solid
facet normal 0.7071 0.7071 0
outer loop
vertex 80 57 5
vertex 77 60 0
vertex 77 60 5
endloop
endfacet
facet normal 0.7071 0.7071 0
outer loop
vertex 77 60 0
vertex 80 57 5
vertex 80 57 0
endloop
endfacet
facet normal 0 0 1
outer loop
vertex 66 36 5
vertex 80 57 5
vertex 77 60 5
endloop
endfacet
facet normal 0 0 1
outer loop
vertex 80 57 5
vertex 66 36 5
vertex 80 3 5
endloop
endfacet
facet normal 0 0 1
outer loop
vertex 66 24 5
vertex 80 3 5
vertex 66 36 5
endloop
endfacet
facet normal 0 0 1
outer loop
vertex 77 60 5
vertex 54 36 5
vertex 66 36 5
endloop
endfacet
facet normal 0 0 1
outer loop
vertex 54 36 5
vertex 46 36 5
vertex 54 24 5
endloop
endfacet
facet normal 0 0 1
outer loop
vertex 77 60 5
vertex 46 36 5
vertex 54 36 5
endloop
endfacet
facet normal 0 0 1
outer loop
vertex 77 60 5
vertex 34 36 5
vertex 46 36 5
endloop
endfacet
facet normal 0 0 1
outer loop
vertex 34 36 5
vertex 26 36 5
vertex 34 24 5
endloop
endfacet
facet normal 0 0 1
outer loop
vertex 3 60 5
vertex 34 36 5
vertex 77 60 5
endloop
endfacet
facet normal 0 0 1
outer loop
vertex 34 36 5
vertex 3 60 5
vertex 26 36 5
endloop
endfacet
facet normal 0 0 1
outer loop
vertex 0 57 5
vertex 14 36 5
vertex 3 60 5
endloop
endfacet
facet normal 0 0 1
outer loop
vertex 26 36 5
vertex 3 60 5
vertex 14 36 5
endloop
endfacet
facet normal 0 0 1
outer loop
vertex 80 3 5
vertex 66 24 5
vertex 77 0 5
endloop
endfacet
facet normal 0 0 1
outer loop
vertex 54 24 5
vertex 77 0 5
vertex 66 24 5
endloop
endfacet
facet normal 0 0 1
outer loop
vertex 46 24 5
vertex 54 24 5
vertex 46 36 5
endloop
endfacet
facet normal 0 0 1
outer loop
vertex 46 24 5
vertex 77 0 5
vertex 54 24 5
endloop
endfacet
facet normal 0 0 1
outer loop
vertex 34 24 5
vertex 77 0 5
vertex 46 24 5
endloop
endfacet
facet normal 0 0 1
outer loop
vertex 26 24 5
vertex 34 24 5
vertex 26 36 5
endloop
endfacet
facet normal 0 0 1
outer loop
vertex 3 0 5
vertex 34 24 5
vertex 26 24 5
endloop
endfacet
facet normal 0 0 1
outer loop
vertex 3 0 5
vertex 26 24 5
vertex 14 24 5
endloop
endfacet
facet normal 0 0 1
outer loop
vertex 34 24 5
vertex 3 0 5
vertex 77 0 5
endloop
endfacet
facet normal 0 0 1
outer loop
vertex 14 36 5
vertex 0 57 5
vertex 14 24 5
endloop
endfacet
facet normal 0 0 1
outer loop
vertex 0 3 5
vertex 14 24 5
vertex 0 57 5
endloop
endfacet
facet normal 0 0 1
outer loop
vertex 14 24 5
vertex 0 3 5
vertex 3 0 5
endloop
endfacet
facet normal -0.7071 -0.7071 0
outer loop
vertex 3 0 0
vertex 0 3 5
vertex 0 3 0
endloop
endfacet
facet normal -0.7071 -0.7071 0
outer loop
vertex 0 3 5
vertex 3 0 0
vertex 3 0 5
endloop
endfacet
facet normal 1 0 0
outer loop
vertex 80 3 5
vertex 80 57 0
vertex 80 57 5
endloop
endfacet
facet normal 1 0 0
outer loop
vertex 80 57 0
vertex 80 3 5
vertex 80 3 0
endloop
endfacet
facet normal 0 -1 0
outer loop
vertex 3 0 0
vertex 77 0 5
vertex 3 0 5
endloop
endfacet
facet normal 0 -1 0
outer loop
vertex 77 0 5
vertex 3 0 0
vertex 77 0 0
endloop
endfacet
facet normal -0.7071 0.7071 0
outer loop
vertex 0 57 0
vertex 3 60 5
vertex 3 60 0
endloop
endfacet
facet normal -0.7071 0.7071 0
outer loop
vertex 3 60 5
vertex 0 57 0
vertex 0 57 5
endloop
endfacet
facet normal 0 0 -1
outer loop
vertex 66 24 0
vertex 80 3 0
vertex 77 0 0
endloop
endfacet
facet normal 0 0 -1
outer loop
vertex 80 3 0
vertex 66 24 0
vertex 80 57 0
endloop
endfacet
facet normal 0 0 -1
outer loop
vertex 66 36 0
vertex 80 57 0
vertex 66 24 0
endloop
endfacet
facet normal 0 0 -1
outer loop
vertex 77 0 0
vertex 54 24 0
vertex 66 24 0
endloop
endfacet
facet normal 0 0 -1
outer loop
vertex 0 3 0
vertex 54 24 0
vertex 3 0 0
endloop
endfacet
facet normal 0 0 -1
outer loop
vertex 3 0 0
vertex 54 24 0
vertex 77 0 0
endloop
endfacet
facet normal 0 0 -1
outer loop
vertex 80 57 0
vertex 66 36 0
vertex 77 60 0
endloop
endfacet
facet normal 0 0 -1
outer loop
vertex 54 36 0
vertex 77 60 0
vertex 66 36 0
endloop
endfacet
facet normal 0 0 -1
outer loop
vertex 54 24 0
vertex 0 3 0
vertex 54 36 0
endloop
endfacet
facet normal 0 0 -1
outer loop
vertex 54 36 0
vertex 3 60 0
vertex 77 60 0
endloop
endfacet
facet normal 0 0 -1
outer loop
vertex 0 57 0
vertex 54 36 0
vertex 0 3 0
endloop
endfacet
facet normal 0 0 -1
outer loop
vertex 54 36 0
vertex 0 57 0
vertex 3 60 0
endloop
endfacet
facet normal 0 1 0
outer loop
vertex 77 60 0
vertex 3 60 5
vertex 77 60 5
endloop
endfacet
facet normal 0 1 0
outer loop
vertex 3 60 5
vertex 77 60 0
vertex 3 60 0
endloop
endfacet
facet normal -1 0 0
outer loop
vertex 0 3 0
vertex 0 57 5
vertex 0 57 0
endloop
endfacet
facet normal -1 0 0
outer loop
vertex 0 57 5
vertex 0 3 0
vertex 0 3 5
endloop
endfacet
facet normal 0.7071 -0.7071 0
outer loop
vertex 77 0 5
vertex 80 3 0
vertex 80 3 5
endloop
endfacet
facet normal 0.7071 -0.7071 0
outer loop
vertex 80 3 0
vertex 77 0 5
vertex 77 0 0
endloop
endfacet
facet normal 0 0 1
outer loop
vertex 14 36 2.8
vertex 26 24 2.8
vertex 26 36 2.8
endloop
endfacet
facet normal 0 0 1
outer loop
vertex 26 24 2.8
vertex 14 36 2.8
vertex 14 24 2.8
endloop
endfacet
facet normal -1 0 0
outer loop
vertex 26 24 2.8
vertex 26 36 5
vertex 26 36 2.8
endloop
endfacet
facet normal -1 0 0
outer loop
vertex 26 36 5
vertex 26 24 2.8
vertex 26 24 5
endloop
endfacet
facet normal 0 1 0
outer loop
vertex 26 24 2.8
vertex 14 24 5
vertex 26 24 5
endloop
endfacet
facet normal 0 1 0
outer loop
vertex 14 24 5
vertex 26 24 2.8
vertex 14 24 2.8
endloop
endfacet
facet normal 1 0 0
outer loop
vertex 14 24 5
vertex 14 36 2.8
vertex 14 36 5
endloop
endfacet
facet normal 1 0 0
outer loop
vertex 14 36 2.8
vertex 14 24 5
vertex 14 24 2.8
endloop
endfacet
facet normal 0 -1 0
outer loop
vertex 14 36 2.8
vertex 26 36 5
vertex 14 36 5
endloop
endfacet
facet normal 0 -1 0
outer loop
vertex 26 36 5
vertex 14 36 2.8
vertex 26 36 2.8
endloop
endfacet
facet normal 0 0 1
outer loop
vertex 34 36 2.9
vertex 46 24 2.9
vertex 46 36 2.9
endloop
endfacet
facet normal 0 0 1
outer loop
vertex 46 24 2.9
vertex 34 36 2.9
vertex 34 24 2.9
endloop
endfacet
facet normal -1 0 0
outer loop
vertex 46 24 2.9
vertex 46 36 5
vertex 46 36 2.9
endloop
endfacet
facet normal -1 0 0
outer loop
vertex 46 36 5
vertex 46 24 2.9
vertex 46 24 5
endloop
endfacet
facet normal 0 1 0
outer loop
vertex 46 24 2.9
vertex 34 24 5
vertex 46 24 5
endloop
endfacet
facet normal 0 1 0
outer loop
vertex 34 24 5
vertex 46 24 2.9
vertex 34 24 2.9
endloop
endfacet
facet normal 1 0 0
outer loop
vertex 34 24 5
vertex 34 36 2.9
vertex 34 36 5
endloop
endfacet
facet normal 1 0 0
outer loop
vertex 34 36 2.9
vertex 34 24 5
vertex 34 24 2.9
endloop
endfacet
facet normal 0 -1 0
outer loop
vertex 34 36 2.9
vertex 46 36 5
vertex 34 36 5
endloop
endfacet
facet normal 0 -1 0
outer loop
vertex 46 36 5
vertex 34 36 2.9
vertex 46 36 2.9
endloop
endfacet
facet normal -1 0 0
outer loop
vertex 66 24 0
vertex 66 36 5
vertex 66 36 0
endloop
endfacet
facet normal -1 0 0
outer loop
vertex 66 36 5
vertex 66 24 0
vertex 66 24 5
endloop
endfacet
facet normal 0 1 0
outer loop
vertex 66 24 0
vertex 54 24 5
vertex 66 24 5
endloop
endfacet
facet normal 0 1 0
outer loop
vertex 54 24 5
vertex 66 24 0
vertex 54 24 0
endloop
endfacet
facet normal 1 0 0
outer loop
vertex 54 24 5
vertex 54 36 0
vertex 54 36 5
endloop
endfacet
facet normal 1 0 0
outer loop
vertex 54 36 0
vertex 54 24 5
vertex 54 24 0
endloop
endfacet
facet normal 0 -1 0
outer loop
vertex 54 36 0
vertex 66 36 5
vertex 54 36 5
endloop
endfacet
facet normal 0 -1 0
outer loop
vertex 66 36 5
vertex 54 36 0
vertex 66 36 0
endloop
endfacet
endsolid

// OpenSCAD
$fn = 32;

// ----------------------------------------------------------------------
// Windowed plate: 3 voids, 80 x 60 x 5 mm
// ----------------------------------------------------------------------

// --- parameters (mm) ---
plate_l = 80;             // plate length, X
plate_w = 60;             // plate width, Y
plate_t = 5;              // plate thickness, Z
edge_margin = 10;         // wall from the plate edge to any window
windows = 3;              // number of windows in the row
win_l = 12;               // window length
win_w = 12;               // window width
win_pitch = 20;           // window pitch along X
depth_1 = 2.2;            // depth of void 1 (full thickness = through)
depth_2 = 2.1;            // depth of void 2 (full thickness = through)
depth_3 = 5;              // depth of void 3 (full thickness = through)
corner_c = 3;             // corner chamfer of the plate

profile = [[3, 0], [77, 0], [80, 3], [80, 57], [77, 60], [3, 60], [0, 57], [0, 3]];  // primary outline, 8 points, counter clockwise
void_1 = [[14, 24], [26, 24], [26, 36], [14, 36]];  // window 1 of the row, 4 points
void_2 = [[34, 24], [46, 24], [46, 36], [34, 36]];  // window 2 of the row, 4 points
void_3 = [[54, 24], [66, 24], [66, 36], [54, 36]];  // window 3 of the row, 4 points

// --- the one profile operation ---
difference() {
  linear_extrude(height = plate_t) polygon(points = profile);
  translate([0, 0, plate_t - depth_1])
    linear_extrude(height = depth_1 + 1) polygon(points = void_1);
  translate([0, 0, plate_t - depth_2])
    linear_extrude(height = depth_2 + 1) polygon(points = void_2);
  translate([0, 0, -1])
    linear_extrude(height = plate_t + 2) polygon(points = void_3);
}
